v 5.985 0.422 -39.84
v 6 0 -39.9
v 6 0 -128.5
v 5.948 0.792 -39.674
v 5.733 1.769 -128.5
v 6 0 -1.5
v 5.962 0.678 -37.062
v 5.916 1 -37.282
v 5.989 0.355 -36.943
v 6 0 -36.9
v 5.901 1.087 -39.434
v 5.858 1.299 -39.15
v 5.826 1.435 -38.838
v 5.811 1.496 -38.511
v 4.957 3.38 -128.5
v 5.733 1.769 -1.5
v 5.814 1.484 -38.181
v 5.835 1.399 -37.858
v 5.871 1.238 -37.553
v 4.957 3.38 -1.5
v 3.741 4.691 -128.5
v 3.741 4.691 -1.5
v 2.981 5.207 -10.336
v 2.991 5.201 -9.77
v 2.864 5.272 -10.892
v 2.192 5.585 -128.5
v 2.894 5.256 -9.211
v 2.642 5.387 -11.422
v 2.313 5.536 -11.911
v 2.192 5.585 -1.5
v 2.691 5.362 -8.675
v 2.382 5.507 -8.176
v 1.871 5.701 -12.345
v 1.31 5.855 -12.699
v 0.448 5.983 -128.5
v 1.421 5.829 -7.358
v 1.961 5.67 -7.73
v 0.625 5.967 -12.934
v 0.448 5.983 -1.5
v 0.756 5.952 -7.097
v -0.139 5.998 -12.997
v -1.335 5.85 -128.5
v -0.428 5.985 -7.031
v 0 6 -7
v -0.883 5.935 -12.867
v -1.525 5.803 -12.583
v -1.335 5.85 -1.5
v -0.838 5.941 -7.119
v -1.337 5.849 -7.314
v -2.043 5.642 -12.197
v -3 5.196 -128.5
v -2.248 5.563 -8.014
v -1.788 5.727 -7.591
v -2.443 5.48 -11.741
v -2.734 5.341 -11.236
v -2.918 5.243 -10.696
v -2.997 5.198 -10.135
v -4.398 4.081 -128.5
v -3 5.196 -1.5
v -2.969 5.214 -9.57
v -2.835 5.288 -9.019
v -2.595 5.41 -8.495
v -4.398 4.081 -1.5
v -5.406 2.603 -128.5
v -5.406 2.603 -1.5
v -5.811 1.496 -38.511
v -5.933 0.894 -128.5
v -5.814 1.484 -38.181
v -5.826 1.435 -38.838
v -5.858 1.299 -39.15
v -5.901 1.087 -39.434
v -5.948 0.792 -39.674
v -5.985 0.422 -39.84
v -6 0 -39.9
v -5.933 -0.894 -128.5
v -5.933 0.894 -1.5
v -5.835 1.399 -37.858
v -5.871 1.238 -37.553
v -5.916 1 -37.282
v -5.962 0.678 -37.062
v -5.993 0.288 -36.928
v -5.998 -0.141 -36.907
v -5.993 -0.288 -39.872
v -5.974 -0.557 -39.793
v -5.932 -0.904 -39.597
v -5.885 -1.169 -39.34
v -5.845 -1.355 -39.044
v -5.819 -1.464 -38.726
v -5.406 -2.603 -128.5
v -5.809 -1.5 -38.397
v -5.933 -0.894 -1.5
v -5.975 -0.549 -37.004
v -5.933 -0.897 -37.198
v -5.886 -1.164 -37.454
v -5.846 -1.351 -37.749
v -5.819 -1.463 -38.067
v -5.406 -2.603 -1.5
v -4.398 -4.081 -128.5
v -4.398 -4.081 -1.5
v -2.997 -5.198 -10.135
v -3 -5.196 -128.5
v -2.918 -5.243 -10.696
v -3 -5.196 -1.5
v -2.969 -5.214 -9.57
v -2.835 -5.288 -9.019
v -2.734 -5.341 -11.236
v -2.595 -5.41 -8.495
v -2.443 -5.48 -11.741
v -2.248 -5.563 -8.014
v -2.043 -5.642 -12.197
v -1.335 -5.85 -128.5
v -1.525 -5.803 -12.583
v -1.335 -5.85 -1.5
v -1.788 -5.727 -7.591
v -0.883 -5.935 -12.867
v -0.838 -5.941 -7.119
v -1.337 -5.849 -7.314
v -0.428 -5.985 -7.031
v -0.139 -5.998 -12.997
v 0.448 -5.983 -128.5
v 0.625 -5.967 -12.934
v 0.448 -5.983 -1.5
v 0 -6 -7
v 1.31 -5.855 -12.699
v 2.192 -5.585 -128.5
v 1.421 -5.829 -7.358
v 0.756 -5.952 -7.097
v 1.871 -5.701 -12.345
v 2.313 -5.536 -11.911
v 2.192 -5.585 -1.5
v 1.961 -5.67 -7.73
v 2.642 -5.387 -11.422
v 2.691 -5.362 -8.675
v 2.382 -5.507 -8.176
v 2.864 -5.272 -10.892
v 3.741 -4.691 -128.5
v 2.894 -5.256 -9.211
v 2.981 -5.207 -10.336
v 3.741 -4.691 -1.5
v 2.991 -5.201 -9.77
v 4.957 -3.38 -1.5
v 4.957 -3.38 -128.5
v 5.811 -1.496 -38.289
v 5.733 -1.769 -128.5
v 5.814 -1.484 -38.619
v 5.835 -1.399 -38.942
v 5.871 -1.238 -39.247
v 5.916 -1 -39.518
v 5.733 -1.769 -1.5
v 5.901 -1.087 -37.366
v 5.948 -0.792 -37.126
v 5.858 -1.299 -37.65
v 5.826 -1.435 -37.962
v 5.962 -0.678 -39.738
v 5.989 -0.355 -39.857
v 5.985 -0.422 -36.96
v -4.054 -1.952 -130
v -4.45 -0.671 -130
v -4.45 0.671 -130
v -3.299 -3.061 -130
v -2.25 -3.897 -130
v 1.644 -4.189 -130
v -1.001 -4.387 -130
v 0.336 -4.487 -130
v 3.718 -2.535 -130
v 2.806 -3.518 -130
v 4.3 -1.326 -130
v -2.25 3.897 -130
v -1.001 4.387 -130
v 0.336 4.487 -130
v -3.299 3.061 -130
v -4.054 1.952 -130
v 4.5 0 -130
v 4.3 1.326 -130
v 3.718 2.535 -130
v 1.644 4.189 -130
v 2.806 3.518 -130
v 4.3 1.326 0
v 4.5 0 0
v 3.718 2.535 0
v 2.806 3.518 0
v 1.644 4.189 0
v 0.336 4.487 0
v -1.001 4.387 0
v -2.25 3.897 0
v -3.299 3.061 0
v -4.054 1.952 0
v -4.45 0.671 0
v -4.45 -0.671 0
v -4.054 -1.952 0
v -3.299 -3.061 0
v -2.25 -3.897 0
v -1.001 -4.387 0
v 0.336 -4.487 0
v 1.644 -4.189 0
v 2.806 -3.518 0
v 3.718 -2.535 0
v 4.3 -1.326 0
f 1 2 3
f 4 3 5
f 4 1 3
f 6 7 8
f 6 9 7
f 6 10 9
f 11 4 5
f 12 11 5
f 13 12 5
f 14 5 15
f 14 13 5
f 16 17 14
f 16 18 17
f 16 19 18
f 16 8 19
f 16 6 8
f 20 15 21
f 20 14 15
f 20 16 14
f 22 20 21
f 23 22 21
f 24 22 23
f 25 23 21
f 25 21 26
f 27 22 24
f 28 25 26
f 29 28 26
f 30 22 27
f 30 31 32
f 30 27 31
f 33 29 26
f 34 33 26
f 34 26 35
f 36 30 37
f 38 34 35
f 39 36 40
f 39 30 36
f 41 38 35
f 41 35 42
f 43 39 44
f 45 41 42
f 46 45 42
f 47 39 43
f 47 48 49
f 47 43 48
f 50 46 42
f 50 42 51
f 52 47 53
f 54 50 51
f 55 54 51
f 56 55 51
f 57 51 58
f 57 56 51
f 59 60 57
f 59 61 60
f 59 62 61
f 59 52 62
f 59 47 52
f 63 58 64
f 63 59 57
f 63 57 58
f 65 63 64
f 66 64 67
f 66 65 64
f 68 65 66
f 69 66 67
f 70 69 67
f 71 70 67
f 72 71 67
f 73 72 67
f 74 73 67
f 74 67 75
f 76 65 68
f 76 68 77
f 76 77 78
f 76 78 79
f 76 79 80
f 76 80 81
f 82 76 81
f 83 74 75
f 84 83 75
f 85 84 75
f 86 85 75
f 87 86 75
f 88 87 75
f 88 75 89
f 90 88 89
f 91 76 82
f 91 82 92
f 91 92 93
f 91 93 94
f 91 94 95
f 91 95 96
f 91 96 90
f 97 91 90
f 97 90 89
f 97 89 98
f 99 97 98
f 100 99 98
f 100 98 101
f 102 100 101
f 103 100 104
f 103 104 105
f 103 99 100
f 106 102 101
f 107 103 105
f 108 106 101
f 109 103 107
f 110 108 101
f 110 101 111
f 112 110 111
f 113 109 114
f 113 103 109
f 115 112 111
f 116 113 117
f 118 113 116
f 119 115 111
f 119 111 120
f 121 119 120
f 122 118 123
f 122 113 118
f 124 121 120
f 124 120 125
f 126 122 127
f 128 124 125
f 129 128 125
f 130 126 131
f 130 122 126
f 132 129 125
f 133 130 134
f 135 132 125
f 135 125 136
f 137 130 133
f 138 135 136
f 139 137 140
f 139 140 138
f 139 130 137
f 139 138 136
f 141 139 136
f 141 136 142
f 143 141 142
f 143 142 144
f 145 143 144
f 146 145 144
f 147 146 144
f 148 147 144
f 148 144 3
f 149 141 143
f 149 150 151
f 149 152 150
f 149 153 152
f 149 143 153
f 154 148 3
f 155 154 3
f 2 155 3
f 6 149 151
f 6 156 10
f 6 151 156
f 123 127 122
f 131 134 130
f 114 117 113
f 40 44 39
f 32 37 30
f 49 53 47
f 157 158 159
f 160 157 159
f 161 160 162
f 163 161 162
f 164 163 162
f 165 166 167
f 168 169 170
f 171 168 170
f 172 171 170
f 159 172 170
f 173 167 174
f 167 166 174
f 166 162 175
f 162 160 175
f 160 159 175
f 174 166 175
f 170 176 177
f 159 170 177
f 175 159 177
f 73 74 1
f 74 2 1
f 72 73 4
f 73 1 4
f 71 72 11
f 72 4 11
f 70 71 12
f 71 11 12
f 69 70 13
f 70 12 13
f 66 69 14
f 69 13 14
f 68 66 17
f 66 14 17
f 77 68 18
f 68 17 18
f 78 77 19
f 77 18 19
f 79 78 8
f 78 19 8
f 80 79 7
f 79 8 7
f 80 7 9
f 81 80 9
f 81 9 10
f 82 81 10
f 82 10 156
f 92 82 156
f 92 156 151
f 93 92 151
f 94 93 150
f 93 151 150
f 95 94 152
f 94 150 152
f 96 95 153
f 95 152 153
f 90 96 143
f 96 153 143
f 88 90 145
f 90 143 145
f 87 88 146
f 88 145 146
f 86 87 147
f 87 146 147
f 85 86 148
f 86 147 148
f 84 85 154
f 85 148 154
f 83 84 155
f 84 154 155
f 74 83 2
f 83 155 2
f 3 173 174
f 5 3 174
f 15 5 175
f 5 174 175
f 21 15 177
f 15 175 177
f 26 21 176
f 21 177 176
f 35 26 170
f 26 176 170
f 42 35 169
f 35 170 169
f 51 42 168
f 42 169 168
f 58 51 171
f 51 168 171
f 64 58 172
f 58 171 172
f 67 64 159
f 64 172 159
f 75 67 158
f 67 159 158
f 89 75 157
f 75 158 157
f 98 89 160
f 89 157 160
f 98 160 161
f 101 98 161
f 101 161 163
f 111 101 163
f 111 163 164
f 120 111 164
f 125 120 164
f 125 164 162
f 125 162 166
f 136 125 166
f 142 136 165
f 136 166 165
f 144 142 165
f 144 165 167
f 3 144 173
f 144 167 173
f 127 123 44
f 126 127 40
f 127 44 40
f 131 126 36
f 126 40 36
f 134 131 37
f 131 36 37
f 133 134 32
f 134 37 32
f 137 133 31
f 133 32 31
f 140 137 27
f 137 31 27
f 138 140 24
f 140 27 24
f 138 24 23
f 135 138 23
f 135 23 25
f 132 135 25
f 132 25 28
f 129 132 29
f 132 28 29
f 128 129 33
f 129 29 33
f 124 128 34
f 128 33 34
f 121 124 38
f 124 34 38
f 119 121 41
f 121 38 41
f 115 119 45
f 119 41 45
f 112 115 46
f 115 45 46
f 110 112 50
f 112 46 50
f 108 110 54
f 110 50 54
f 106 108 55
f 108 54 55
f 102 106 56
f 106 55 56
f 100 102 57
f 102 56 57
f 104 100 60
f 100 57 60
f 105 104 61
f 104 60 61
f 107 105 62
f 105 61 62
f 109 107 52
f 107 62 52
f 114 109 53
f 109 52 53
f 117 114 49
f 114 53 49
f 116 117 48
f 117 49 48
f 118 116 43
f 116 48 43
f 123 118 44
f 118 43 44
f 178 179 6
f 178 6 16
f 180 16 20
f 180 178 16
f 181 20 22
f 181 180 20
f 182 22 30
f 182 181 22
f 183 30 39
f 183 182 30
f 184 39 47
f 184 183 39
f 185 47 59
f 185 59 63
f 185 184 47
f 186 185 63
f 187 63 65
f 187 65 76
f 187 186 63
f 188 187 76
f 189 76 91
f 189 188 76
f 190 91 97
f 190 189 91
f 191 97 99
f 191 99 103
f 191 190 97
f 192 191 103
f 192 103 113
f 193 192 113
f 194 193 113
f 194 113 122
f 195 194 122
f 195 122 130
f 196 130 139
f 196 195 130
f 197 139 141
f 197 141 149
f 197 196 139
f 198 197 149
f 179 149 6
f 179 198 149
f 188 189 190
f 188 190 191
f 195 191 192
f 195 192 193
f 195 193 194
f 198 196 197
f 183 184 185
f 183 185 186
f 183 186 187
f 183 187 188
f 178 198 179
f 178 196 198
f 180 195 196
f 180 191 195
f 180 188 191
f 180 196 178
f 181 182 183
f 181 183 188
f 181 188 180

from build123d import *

# Parameters (mm, degrees)
ESQUISSE1_R             = 6
BASE_EXTRUSION_DEPTH    = 130
CHANFREIN1_SIZE         = 1.5
ESQUISSE4_R             = 3
ENL_V_MAT_EXTRU_1_DEPTH = 10
ESQUISSE6_R             = 1.5
ENL_V_MAT_EXTRU_2_DEPTH = 10


with BuildPart() as part:
    # Esquisse1 → Base-Extrusion (new body)
    with BuildSketch(Plane.XY):
        Circle(ESQUISSE1_R)
    extrude(amount=-BASE_EXTRUSION_DEPTH)

    # Chanfrein1
    chanfrein1_edges = [part.edges().sort_by_distance(p)[0] for p in [
        (-6, 0, 0),
        (-6, 0, -130),
    ]]
    chamfer(chanfrein1_edges, length=CHANFREIN1_SIZE)

    # Esquisse4 → Enlèv. mat.-Extru.1 (cut, symmetric)
    with BuildSketch(Plane(origin=(0, 0, 0), x_dir=(1, 0, 0), z_dir=(0, 1, 0))):
        with Locations(Location((0, 10, 0), (0, 0, 270))):
            Circle(ESQUISSE4_R)
    extrude(amount=ENL_V_MAT_EXTRU_1_DEPTH, both=True, mode=Mode.SUBTRACT)

    # Esquisse6 → Enlèv. mat.-Extru.2 (cut, symmetric)
    with BuildSketch(Plane(origin=(0, 0, 0), x_dir=(0, 0, -1), z_dir=(1, 0, 0))):
        with Locations((38.4, 0)):
            Circle(ESQUISSE6_R)
    extrude(amount=ENL_V_MAT_EXTRU_2_DEPTH, both=True, mode=Mode.SUBTRACT)


solid = part.part
